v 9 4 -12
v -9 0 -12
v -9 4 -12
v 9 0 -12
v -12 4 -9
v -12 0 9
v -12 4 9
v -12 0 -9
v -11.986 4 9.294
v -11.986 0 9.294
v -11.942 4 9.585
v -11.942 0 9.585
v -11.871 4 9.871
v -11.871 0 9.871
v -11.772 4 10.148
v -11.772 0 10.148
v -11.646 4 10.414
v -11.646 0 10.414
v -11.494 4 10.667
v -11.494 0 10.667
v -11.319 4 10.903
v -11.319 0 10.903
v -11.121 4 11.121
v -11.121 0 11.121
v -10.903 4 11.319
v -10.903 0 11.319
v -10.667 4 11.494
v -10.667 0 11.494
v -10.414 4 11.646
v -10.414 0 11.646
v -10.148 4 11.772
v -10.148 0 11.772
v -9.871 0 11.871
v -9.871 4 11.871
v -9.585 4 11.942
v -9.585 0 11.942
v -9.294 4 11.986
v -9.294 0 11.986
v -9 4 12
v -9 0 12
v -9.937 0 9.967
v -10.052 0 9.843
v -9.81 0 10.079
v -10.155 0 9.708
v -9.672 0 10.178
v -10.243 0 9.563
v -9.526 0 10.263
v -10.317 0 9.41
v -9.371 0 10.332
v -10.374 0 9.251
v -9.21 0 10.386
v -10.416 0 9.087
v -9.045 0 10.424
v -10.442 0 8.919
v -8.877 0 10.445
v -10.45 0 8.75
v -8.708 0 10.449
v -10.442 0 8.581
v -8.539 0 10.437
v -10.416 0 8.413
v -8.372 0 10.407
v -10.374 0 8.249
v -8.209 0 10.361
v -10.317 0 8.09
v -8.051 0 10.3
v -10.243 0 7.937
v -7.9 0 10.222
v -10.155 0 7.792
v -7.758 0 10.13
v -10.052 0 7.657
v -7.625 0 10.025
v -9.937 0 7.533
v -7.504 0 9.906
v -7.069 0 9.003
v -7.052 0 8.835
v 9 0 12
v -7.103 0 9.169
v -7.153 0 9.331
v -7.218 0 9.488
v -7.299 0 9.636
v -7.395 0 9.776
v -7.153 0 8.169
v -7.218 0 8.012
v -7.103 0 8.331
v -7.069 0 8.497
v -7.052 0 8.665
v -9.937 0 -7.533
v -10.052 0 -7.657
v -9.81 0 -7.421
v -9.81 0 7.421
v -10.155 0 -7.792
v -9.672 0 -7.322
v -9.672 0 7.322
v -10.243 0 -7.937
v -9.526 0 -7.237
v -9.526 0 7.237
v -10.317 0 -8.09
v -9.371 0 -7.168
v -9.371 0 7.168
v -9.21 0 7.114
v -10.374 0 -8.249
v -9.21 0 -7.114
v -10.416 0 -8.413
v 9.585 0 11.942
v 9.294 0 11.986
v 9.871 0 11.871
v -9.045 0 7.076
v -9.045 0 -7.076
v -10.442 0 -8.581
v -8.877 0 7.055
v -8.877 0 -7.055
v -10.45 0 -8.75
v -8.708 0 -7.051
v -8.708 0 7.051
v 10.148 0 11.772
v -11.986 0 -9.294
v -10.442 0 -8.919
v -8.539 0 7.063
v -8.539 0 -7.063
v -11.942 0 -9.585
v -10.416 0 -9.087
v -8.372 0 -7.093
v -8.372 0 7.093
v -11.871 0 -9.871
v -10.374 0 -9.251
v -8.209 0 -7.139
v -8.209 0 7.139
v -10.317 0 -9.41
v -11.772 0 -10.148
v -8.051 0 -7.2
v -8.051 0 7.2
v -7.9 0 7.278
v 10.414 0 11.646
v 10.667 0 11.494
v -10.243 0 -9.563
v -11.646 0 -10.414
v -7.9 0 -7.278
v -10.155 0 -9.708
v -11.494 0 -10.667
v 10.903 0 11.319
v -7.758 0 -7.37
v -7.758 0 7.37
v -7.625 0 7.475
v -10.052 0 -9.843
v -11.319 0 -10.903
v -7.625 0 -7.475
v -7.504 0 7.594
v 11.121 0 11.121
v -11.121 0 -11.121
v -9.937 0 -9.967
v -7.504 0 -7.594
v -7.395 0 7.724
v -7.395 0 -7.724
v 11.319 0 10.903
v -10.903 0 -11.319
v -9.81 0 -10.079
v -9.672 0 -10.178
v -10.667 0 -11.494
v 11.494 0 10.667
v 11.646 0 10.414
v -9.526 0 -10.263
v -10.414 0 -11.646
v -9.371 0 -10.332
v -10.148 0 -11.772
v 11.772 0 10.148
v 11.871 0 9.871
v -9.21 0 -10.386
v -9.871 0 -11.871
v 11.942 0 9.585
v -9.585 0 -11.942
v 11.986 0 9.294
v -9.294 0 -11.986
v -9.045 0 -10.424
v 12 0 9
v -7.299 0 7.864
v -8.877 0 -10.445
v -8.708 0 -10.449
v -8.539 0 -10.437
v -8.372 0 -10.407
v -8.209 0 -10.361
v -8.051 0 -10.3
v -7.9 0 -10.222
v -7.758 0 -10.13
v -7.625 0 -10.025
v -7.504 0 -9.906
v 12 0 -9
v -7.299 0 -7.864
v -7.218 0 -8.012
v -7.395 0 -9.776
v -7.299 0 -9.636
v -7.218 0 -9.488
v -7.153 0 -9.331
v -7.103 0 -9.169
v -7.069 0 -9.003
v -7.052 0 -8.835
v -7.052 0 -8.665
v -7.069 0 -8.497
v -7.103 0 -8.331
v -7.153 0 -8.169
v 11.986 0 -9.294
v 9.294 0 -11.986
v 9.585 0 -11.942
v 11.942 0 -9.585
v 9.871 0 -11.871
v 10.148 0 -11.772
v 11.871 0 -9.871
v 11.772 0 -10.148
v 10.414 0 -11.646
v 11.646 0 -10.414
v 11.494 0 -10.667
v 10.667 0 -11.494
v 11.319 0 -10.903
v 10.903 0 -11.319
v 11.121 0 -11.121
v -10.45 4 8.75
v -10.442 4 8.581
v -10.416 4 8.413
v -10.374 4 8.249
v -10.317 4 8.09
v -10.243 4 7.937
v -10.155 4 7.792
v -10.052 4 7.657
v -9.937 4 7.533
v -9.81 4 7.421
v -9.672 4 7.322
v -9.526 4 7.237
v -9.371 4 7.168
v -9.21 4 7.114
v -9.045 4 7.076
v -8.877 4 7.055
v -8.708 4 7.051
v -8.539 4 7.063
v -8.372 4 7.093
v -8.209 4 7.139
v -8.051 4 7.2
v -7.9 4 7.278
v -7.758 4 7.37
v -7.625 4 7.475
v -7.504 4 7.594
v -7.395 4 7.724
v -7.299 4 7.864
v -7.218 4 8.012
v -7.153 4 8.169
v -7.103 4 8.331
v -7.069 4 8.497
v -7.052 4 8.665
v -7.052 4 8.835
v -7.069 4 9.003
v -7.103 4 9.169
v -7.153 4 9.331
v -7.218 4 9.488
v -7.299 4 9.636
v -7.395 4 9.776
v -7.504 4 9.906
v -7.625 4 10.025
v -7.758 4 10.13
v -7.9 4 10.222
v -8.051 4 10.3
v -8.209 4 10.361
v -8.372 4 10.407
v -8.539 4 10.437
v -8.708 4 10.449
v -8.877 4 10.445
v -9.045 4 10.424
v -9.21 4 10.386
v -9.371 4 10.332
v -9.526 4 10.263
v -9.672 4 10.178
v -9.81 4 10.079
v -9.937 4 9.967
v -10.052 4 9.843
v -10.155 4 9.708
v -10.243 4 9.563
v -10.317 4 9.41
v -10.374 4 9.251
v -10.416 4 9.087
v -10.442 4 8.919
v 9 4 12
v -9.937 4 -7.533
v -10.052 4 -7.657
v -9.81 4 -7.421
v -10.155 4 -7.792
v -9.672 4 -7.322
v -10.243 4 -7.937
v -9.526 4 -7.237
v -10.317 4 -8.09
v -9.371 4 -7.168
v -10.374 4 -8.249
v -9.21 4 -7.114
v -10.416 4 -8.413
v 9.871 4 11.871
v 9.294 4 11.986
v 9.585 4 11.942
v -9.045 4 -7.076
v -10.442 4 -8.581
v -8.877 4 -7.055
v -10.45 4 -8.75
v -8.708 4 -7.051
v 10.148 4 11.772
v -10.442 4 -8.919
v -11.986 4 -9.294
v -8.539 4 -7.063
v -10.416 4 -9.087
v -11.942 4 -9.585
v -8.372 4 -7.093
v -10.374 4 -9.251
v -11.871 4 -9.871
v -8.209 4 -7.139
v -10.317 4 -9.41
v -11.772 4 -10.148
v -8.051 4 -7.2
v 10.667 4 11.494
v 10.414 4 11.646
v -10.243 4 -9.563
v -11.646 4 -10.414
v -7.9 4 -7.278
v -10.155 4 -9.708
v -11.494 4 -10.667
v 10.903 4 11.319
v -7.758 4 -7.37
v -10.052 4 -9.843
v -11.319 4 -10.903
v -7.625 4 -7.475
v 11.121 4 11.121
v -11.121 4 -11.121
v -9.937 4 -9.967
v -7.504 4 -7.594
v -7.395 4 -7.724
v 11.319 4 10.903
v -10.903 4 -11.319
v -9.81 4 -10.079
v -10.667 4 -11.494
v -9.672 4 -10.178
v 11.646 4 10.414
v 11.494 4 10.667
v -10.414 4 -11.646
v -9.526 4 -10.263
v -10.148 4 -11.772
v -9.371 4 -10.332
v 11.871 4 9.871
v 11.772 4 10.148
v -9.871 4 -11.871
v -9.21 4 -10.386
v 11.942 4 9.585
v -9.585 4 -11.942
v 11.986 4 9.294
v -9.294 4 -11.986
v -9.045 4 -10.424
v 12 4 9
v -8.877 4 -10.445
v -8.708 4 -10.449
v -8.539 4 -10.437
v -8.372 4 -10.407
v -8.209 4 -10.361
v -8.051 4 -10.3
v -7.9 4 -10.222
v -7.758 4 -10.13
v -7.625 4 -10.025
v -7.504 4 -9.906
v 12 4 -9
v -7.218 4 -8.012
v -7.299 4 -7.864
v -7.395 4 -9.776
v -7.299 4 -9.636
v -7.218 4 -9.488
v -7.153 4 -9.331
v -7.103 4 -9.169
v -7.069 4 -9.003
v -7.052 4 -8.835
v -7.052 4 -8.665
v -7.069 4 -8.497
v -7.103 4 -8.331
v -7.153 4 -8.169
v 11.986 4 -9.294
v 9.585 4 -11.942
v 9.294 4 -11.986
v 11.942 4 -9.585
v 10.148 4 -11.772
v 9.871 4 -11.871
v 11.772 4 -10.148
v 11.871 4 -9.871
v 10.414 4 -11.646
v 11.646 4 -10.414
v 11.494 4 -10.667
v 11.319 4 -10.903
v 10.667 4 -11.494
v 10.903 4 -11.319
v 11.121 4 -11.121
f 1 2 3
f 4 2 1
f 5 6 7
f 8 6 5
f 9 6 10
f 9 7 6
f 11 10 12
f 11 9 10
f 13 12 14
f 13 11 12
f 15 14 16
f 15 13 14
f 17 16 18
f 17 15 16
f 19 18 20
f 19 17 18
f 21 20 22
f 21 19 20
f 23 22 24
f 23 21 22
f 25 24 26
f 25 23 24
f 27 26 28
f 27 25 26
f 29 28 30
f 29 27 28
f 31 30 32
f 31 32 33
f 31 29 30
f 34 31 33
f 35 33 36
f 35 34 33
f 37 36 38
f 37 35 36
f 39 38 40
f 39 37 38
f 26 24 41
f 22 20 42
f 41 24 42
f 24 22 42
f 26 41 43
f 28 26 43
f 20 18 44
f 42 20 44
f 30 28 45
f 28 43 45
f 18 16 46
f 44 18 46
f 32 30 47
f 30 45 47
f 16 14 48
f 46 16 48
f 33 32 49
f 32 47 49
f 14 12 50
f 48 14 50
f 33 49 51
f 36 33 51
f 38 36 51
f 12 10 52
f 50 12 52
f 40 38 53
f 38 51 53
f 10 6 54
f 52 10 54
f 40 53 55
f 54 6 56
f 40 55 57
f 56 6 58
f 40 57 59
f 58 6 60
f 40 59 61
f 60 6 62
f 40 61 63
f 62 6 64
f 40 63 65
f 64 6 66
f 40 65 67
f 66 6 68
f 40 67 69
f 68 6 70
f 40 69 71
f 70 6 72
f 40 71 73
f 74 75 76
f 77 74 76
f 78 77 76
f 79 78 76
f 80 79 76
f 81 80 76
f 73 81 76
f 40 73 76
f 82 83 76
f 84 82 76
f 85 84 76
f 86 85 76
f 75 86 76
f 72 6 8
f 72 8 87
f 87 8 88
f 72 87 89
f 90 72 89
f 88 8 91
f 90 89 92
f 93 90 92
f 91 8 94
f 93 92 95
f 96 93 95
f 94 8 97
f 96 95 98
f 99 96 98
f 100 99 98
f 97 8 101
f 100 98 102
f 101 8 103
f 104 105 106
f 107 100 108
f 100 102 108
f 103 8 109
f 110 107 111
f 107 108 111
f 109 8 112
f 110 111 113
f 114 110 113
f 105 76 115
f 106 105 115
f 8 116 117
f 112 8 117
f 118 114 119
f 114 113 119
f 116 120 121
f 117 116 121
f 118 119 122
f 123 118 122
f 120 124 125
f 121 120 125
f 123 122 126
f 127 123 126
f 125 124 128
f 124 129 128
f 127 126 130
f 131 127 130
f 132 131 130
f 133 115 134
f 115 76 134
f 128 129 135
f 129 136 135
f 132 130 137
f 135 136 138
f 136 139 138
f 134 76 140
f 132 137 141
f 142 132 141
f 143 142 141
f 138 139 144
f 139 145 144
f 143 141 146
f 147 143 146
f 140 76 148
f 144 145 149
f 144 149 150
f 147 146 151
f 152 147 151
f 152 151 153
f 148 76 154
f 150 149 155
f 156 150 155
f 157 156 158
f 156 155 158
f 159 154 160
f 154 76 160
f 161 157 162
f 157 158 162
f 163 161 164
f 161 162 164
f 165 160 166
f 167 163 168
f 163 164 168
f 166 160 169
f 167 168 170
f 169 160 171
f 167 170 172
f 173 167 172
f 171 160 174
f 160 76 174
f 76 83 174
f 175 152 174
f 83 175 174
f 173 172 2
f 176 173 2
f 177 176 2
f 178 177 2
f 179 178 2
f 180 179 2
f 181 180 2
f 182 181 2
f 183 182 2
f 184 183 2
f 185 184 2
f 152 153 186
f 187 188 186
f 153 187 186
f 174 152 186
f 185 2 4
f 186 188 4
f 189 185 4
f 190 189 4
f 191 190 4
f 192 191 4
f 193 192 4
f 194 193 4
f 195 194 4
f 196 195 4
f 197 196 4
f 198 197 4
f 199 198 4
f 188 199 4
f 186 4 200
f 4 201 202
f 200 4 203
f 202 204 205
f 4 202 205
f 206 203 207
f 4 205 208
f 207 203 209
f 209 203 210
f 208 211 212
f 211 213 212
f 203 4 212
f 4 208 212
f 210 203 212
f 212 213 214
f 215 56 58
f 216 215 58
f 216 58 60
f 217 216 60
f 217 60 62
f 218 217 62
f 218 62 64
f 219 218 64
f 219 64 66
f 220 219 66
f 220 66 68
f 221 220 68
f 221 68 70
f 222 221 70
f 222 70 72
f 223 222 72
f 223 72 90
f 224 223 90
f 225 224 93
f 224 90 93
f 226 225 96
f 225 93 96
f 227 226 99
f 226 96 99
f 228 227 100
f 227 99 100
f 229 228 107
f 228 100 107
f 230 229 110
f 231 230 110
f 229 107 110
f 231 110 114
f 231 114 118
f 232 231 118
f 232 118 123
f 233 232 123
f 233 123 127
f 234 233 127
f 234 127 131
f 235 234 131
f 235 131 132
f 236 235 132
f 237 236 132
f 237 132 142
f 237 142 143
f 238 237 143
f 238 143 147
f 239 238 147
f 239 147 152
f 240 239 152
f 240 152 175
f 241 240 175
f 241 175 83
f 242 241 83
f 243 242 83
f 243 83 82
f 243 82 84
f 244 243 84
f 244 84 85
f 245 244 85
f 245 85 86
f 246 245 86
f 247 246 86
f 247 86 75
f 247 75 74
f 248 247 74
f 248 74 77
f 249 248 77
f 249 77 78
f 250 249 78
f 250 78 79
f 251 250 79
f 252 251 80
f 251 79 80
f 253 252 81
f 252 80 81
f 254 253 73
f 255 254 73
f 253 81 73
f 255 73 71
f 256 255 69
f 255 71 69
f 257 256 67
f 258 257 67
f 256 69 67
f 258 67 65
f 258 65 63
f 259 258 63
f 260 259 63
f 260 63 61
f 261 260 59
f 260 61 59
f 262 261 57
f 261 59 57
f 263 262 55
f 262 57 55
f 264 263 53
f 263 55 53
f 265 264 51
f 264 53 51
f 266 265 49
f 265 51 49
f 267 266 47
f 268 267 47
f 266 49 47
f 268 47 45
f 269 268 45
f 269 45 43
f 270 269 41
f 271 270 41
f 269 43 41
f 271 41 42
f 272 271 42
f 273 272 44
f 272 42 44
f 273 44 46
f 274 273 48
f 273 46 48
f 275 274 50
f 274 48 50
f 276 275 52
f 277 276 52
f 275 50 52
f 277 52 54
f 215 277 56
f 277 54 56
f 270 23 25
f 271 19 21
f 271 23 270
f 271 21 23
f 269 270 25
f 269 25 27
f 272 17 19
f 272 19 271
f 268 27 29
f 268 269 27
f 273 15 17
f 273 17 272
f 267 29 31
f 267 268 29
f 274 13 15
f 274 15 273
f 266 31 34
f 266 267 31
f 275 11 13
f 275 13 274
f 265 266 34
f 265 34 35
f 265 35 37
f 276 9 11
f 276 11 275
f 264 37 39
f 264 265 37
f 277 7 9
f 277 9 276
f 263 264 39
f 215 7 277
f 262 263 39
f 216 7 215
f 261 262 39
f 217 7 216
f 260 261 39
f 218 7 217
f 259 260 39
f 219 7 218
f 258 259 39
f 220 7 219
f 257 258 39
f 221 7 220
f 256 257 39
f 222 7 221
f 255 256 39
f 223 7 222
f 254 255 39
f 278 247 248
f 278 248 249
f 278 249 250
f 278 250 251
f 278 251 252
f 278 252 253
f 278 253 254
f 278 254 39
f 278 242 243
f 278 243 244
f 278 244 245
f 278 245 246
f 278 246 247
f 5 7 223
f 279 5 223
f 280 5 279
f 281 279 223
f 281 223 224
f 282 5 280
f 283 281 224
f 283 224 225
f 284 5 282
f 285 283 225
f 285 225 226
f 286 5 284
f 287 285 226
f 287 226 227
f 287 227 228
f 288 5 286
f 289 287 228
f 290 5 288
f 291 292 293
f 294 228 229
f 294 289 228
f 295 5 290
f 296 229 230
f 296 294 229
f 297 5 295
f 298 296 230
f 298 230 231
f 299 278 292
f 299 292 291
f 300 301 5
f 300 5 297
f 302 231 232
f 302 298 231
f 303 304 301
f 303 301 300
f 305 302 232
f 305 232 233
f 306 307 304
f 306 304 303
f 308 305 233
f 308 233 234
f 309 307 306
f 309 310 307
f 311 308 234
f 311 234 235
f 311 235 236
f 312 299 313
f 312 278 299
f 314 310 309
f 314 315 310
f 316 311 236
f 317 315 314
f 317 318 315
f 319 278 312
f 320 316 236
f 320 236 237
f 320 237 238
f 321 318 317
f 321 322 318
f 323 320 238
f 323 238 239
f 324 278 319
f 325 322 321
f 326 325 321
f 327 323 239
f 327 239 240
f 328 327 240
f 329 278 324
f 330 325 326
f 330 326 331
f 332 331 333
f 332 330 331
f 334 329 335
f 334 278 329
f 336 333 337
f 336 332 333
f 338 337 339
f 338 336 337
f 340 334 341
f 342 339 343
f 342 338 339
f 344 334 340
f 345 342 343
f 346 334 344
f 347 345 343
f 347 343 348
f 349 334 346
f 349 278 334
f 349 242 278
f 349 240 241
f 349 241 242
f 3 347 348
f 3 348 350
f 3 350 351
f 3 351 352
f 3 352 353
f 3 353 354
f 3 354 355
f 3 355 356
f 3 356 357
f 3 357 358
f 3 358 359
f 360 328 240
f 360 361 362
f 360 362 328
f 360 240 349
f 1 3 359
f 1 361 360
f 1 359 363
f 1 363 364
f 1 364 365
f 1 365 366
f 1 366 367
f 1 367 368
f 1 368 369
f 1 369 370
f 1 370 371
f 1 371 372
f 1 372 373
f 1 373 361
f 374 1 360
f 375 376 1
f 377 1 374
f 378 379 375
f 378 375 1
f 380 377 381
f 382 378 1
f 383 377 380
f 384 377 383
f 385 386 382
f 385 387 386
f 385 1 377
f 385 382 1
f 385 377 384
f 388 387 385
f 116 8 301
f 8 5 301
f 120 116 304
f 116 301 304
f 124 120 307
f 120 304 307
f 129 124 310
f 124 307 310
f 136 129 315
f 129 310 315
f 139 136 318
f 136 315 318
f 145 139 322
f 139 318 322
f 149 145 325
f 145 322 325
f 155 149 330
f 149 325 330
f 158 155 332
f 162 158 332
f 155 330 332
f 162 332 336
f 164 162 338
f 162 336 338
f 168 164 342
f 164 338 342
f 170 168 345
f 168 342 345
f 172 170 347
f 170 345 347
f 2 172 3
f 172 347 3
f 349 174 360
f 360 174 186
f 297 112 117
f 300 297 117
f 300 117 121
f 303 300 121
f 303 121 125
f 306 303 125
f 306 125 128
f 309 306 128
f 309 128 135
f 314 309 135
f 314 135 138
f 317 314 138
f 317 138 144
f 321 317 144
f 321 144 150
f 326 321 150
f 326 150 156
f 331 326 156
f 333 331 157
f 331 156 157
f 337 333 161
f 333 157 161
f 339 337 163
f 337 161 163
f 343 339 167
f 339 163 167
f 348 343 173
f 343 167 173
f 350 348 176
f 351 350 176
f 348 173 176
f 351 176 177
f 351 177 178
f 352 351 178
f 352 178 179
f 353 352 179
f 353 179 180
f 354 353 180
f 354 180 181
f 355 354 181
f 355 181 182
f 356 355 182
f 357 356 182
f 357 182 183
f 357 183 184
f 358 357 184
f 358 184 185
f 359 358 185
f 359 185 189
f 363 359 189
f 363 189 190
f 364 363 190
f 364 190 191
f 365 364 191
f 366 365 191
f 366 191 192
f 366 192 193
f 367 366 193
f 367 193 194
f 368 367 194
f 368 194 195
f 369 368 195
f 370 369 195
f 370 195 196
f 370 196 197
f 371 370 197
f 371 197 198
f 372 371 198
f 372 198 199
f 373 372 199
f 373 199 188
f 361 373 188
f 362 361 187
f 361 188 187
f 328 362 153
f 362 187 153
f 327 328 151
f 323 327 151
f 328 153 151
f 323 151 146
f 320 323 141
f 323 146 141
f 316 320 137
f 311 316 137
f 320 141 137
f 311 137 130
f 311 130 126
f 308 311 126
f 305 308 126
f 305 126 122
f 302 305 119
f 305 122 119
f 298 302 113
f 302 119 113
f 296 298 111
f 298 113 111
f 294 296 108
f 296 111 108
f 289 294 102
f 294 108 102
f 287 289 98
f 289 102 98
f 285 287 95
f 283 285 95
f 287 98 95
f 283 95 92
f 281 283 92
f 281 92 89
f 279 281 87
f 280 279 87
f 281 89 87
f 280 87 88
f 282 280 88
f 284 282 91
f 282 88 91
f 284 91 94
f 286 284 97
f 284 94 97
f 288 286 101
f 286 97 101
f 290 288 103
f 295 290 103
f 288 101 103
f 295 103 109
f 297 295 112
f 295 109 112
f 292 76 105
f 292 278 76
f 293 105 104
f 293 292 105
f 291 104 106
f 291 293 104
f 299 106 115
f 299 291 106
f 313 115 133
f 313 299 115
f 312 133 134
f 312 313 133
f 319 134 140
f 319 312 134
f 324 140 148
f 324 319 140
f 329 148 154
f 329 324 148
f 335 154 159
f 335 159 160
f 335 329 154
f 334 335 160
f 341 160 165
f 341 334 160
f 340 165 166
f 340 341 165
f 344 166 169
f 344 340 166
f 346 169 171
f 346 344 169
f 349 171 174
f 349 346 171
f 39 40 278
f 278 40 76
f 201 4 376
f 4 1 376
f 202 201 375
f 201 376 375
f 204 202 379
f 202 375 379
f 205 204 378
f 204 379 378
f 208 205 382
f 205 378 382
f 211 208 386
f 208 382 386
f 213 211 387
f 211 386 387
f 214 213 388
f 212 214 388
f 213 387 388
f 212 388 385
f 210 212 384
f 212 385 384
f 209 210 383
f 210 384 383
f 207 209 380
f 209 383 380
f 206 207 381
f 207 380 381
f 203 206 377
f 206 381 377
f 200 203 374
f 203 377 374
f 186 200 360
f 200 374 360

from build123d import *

# Parameters (mm, degrees)
ESQUISSE1_W        = 24
ESQUISSE1_H        = 24
BOSS_EXTRU_1_DEPTH = 4
D_GAGEMENT_M31_D   = 3.4
CONG_1_R           = 3


with BuildPart() as part:
    # Esquisse1 → Boss.-Extru.1 (new body)
    with BuildSketch(Plane(origin=(0, 0, 0), x_dir=(1, 0, 0), z_dir=(0, 1, 0))):
        Rectangle(ESQUISSE1_W, ESQUISSE1_H)
    extrude(amount=BOSS_EXTRU_1_DEPTH)

    # Dégagement M31 (through all)
    with Locations(Plane(origin=(0, 4, 0), x_dir=(1, 0, 0), z_dir=(0, 1, 0))):
        with Locations((-8.75, -8.75), (-8.75, 8.75)):
            Hole(D_GAGEMENT_M31_D / 2)

    # Congé1
    cong_1_edges = [part.edges().sort_by_distance(p)[0] for p in [
        (12, 2, 12),
        (-12, 2, 12),
        (-12, 2, -12),
        (12, 2, -12),
    ]]
    fillet(cong_1_edges, radius=CONG_1_R)


solid = part.part
